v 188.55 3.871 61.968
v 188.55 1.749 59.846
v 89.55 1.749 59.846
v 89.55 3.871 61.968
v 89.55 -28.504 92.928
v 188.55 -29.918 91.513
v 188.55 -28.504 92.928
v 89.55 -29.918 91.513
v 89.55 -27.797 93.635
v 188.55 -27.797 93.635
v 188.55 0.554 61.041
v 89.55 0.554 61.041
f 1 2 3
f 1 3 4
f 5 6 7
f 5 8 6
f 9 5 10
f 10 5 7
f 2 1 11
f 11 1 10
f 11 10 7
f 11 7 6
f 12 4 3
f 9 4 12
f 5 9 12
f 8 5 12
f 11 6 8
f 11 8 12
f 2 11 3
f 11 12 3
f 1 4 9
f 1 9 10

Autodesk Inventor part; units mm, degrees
ref_plane "YZ Plane" through (0, 0, 0) normal (1, 0, 0) x (0, 1, 0)
ref_plane "XZ Plane" through (0, 0, 0) normal (0, 1, 0) x (-1, 0, 0)
ref_plane "Work Plane1" through (89.5496, -22.0458, 63.3377) normal (-1, 0, 0) x (0, -1, 0)
sketch "Sketch1" plane through (89.5496, -22.0458, 63.3377) normal (-1, 0, 0) x (0, -1, 0)
  line L0 (17.6, -19.3036) -> (17.6, 37.9036) projected
  line L1 (17.6, 37.9036) -> (-22.6, -2.2964) projected
  line L2 (-22.6, -2.2964) -> (-22.6, -53.1036) projected
  line L3 (-22.6, -53.1036) -> (-14.1, -53.1036) projected
  line L4 (-14.1, -53.1036) -> (-14.1, -37.9036) projected
  arc A0 (4.5, -19.3036) -> (-14.1, -37.9036) centre (4.5, -37.9036) ccw projected
  line L5 (4.5, -19.3036) -> (17.6, -19.3036) projected
  line L6 (20.6, 45.1462) -> (20.6, 40.9036) projected
  line L7 (5.7508, 30.297) -> (20.6, 45.1462) projected
  line L8 (7.8721, 28.1756) -> (5.7508, 30.297) projected
  line L9 (20.6, 40.9036) -> (7.8721, 28.1756) projected
  line L10 (7.8721, 28.1756) -> (6.4579, 29.5899)
  line L11 (6.4579, 29.5899) -> (-23.1664, -0.0344)
  line L12 (-22.6, -2.2964) -> (-23.795, -3.4915)
  line L13 (-23.795, -3.4915) -> (-26.5199, -0.7666)
  line L14 (-23.1664, -0.0344) -> (-26.5411, -3.4091)
  point P0 (-22.0458, -63.3377)
  point P1 (-25.2092, -2.0772)
  dimension "d0" = 2
ref_plane "Work Plane2" through (188.5496, -39.6458, 10.2341) normal (1, 0, 0) x (0, 1, 0)
extrude "Extrusion1" add sketch "Sketch1" against normal up to surface (99 mm away) contours L1 L12 L13 L14 L11 L8
sketch "Sketch2" plane through (89.5496, 3.1634, 61.2604) normal (0, 0.7071, 0.7071) x (1, 0, 0)
  line L0 (99, -44.784) -> (99, 0) projected
  line L1 (0, 0) -> (99, 0) projected
  line L2 (0, -44.784) -> (0, 0) projected
  line L3 (0, -44.784) -> (99, -44.784) projected
  point P0 (-89.5496, 41.0808)
extrude "Extrusion2" add sketch "Sketch2" along normal blind 1
properties part number "plugg"
